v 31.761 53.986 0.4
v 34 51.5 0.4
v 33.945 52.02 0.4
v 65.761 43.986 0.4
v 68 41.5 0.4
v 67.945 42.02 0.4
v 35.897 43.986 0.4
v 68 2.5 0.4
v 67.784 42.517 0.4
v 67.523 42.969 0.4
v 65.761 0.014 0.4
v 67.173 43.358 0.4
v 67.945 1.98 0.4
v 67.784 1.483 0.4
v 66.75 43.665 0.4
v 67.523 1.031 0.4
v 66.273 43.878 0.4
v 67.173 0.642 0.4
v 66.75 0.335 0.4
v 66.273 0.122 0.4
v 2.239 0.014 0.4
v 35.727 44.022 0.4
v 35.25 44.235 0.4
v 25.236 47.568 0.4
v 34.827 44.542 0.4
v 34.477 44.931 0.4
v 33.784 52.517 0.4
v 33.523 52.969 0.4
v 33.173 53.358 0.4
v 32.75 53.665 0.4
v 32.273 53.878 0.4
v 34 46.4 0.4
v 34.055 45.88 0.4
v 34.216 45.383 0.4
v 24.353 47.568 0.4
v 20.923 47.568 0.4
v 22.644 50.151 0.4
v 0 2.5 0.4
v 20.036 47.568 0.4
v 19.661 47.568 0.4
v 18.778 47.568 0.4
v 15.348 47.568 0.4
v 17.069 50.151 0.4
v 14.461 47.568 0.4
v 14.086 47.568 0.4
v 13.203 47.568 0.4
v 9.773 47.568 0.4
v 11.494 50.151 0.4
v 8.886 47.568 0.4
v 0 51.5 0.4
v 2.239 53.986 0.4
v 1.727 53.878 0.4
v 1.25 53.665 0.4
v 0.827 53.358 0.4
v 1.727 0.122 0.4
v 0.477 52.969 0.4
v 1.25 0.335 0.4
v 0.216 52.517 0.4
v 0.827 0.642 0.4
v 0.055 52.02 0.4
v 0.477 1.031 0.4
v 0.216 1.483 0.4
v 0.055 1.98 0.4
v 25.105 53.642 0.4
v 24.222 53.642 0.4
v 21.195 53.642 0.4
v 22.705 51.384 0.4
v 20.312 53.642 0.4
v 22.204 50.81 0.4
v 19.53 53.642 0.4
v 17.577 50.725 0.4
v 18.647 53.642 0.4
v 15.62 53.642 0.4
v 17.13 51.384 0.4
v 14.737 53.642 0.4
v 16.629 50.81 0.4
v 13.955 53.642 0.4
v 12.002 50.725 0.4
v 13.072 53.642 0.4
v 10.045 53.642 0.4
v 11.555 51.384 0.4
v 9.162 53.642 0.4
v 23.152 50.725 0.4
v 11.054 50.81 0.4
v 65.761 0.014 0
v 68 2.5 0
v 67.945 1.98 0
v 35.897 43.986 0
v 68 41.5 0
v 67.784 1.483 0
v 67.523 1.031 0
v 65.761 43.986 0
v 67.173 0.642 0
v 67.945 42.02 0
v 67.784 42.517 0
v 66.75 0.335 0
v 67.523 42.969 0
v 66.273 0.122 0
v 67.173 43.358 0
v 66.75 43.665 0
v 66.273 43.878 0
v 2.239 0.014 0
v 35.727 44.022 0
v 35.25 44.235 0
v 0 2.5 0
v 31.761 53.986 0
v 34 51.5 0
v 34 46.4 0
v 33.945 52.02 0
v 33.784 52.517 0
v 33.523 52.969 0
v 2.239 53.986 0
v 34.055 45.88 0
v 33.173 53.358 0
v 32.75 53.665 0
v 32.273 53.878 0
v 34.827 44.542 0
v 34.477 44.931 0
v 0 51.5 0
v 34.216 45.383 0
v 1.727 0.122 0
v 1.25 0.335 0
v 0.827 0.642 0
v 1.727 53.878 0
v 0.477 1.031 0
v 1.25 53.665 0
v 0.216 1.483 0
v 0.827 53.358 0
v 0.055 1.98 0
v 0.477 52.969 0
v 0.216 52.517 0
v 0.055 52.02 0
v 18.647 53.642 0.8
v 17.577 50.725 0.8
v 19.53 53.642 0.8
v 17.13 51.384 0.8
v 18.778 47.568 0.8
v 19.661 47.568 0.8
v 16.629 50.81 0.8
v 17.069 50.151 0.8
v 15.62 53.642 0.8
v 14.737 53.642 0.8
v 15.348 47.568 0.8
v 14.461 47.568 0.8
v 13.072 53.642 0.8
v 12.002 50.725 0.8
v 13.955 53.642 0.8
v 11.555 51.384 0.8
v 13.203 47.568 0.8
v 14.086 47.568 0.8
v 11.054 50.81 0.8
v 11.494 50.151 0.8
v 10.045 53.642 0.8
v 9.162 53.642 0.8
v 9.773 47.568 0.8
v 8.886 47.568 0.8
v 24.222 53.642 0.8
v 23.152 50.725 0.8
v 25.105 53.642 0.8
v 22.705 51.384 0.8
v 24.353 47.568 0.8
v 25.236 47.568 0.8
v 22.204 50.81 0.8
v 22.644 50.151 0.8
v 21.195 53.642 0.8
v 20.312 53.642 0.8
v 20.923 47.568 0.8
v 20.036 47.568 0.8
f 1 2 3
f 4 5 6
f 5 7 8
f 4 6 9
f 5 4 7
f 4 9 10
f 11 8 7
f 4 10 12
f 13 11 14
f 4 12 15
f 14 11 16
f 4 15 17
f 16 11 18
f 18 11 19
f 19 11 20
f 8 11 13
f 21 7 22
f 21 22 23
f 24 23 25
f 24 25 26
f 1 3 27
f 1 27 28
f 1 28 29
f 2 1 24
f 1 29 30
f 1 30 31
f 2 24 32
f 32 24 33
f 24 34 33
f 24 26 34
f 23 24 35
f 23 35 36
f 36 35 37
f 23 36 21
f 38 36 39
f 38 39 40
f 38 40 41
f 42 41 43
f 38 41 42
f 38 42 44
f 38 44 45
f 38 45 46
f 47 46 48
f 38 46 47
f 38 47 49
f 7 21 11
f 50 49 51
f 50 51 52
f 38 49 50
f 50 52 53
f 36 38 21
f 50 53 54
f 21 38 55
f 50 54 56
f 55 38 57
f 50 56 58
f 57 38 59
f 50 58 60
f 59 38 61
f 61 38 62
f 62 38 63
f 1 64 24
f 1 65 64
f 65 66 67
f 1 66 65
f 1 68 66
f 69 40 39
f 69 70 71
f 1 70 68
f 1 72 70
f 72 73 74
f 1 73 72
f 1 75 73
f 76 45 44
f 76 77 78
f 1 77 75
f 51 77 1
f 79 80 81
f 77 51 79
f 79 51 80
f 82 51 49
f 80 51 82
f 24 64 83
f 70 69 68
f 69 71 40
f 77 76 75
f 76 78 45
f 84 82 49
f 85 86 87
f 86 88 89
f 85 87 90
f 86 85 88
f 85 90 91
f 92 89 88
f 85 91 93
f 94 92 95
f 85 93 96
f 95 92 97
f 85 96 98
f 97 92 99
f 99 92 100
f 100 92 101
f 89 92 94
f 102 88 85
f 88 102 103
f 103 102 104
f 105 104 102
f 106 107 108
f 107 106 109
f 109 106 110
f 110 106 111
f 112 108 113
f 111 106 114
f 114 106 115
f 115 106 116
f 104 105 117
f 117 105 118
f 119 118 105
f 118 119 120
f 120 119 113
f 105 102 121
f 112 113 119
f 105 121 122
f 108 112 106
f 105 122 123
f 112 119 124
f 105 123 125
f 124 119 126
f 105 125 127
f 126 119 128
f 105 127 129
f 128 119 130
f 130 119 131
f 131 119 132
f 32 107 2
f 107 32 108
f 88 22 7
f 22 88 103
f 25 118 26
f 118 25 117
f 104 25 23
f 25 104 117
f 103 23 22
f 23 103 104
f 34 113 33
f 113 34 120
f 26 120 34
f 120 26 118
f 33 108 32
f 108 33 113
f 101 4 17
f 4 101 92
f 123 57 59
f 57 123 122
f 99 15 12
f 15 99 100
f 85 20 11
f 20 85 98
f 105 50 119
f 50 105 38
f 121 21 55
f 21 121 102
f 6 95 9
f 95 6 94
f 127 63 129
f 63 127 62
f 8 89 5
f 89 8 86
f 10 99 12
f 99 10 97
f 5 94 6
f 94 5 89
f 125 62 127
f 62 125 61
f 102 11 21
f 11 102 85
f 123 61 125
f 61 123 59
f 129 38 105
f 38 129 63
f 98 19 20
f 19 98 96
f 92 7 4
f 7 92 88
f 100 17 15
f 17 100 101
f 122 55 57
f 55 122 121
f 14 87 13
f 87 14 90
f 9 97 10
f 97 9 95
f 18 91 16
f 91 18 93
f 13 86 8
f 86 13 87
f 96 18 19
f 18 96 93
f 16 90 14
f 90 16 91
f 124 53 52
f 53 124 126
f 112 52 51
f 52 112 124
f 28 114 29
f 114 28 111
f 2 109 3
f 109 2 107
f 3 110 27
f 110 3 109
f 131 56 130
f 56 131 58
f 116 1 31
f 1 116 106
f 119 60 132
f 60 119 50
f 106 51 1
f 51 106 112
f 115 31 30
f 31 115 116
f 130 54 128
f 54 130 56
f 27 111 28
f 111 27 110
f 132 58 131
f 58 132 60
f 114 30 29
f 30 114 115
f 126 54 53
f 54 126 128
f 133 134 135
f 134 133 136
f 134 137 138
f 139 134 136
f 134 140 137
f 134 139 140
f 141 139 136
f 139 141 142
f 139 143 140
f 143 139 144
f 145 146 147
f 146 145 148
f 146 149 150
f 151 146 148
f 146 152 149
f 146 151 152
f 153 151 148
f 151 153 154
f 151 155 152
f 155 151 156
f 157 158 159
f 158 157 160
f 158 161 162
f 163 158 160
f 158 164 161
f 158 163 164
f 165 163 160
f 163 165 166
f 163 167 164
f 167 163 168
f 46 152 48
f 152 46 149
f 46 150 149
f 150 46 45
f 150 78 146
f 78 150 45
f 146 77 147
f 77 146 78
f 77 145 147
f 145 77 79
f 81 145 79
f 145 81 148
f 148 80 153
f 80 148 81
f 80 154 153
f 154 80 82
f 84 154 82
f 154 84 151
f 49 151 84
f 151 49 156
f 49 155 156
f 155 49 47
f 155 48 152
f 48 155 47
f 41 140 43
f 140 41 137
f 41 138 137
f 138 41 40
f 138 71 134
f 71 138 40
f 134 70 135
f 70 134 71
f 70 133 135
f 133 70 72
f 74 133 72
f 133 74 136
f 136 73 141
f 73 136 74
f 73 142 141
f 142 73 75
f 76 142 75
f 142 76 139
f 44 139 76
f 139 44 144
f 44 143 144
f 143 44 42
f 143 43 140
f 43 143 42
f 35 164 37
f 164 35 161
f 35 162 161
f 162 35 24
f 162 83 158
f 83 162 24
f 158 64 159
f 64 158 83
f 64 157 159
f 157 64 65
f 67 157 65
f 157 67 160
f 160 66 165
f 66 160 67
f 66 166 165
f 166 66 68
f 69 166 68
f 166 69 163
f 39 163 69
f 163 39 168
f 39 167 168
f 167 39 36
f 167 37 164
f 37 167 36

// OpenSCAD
// file: divider_common.scad
H = 44;
W = 68;
THICK = 0.4;
TAB_H = 10;

RAD = 2.5;

PAD = 0.1;

$fn = 30;

module rounded(width, height) {
    w = width - RAD *2;
    h = height - RAD *2;
    hull() {
        translate([RAD, RAD, 0]) cube([w, h, THICK]);
        translate([RAD, RAD, 0]) cylinder(r=RAD, h=THICK);
        translate([RAD+w, RAD, 0]) cylinder(r=RAD, h=THICK);
        translate([RAD, RAD+h, 0]) cylinder(r=RAD, h=THICK);
        translate([RAD+w, RAD+h, 0]) cylinder(r=RAD, h=THICK);
    }
}
// main file
TEXT = "XXX";

include <divider_common.scad>

union() {
    rounded(W, H);
    rounded(W/2, H+TAB_H);

    translate([W/2, H-PAD, 0]) {
        difference() {
            cube([RAD, RAD, THICK]);
            translate([RAD, RAD, 0])cylinder(r=RAD, h=THICK);
        }
    }
    #translate([W/2/2, H + TAB_H - 0.5, 0]) linear_extrude(THICK*2) text(TEXT, size=6, font="Gloucester MT Extra Condensed:style=Regular", valign="top", halign="center");
}
